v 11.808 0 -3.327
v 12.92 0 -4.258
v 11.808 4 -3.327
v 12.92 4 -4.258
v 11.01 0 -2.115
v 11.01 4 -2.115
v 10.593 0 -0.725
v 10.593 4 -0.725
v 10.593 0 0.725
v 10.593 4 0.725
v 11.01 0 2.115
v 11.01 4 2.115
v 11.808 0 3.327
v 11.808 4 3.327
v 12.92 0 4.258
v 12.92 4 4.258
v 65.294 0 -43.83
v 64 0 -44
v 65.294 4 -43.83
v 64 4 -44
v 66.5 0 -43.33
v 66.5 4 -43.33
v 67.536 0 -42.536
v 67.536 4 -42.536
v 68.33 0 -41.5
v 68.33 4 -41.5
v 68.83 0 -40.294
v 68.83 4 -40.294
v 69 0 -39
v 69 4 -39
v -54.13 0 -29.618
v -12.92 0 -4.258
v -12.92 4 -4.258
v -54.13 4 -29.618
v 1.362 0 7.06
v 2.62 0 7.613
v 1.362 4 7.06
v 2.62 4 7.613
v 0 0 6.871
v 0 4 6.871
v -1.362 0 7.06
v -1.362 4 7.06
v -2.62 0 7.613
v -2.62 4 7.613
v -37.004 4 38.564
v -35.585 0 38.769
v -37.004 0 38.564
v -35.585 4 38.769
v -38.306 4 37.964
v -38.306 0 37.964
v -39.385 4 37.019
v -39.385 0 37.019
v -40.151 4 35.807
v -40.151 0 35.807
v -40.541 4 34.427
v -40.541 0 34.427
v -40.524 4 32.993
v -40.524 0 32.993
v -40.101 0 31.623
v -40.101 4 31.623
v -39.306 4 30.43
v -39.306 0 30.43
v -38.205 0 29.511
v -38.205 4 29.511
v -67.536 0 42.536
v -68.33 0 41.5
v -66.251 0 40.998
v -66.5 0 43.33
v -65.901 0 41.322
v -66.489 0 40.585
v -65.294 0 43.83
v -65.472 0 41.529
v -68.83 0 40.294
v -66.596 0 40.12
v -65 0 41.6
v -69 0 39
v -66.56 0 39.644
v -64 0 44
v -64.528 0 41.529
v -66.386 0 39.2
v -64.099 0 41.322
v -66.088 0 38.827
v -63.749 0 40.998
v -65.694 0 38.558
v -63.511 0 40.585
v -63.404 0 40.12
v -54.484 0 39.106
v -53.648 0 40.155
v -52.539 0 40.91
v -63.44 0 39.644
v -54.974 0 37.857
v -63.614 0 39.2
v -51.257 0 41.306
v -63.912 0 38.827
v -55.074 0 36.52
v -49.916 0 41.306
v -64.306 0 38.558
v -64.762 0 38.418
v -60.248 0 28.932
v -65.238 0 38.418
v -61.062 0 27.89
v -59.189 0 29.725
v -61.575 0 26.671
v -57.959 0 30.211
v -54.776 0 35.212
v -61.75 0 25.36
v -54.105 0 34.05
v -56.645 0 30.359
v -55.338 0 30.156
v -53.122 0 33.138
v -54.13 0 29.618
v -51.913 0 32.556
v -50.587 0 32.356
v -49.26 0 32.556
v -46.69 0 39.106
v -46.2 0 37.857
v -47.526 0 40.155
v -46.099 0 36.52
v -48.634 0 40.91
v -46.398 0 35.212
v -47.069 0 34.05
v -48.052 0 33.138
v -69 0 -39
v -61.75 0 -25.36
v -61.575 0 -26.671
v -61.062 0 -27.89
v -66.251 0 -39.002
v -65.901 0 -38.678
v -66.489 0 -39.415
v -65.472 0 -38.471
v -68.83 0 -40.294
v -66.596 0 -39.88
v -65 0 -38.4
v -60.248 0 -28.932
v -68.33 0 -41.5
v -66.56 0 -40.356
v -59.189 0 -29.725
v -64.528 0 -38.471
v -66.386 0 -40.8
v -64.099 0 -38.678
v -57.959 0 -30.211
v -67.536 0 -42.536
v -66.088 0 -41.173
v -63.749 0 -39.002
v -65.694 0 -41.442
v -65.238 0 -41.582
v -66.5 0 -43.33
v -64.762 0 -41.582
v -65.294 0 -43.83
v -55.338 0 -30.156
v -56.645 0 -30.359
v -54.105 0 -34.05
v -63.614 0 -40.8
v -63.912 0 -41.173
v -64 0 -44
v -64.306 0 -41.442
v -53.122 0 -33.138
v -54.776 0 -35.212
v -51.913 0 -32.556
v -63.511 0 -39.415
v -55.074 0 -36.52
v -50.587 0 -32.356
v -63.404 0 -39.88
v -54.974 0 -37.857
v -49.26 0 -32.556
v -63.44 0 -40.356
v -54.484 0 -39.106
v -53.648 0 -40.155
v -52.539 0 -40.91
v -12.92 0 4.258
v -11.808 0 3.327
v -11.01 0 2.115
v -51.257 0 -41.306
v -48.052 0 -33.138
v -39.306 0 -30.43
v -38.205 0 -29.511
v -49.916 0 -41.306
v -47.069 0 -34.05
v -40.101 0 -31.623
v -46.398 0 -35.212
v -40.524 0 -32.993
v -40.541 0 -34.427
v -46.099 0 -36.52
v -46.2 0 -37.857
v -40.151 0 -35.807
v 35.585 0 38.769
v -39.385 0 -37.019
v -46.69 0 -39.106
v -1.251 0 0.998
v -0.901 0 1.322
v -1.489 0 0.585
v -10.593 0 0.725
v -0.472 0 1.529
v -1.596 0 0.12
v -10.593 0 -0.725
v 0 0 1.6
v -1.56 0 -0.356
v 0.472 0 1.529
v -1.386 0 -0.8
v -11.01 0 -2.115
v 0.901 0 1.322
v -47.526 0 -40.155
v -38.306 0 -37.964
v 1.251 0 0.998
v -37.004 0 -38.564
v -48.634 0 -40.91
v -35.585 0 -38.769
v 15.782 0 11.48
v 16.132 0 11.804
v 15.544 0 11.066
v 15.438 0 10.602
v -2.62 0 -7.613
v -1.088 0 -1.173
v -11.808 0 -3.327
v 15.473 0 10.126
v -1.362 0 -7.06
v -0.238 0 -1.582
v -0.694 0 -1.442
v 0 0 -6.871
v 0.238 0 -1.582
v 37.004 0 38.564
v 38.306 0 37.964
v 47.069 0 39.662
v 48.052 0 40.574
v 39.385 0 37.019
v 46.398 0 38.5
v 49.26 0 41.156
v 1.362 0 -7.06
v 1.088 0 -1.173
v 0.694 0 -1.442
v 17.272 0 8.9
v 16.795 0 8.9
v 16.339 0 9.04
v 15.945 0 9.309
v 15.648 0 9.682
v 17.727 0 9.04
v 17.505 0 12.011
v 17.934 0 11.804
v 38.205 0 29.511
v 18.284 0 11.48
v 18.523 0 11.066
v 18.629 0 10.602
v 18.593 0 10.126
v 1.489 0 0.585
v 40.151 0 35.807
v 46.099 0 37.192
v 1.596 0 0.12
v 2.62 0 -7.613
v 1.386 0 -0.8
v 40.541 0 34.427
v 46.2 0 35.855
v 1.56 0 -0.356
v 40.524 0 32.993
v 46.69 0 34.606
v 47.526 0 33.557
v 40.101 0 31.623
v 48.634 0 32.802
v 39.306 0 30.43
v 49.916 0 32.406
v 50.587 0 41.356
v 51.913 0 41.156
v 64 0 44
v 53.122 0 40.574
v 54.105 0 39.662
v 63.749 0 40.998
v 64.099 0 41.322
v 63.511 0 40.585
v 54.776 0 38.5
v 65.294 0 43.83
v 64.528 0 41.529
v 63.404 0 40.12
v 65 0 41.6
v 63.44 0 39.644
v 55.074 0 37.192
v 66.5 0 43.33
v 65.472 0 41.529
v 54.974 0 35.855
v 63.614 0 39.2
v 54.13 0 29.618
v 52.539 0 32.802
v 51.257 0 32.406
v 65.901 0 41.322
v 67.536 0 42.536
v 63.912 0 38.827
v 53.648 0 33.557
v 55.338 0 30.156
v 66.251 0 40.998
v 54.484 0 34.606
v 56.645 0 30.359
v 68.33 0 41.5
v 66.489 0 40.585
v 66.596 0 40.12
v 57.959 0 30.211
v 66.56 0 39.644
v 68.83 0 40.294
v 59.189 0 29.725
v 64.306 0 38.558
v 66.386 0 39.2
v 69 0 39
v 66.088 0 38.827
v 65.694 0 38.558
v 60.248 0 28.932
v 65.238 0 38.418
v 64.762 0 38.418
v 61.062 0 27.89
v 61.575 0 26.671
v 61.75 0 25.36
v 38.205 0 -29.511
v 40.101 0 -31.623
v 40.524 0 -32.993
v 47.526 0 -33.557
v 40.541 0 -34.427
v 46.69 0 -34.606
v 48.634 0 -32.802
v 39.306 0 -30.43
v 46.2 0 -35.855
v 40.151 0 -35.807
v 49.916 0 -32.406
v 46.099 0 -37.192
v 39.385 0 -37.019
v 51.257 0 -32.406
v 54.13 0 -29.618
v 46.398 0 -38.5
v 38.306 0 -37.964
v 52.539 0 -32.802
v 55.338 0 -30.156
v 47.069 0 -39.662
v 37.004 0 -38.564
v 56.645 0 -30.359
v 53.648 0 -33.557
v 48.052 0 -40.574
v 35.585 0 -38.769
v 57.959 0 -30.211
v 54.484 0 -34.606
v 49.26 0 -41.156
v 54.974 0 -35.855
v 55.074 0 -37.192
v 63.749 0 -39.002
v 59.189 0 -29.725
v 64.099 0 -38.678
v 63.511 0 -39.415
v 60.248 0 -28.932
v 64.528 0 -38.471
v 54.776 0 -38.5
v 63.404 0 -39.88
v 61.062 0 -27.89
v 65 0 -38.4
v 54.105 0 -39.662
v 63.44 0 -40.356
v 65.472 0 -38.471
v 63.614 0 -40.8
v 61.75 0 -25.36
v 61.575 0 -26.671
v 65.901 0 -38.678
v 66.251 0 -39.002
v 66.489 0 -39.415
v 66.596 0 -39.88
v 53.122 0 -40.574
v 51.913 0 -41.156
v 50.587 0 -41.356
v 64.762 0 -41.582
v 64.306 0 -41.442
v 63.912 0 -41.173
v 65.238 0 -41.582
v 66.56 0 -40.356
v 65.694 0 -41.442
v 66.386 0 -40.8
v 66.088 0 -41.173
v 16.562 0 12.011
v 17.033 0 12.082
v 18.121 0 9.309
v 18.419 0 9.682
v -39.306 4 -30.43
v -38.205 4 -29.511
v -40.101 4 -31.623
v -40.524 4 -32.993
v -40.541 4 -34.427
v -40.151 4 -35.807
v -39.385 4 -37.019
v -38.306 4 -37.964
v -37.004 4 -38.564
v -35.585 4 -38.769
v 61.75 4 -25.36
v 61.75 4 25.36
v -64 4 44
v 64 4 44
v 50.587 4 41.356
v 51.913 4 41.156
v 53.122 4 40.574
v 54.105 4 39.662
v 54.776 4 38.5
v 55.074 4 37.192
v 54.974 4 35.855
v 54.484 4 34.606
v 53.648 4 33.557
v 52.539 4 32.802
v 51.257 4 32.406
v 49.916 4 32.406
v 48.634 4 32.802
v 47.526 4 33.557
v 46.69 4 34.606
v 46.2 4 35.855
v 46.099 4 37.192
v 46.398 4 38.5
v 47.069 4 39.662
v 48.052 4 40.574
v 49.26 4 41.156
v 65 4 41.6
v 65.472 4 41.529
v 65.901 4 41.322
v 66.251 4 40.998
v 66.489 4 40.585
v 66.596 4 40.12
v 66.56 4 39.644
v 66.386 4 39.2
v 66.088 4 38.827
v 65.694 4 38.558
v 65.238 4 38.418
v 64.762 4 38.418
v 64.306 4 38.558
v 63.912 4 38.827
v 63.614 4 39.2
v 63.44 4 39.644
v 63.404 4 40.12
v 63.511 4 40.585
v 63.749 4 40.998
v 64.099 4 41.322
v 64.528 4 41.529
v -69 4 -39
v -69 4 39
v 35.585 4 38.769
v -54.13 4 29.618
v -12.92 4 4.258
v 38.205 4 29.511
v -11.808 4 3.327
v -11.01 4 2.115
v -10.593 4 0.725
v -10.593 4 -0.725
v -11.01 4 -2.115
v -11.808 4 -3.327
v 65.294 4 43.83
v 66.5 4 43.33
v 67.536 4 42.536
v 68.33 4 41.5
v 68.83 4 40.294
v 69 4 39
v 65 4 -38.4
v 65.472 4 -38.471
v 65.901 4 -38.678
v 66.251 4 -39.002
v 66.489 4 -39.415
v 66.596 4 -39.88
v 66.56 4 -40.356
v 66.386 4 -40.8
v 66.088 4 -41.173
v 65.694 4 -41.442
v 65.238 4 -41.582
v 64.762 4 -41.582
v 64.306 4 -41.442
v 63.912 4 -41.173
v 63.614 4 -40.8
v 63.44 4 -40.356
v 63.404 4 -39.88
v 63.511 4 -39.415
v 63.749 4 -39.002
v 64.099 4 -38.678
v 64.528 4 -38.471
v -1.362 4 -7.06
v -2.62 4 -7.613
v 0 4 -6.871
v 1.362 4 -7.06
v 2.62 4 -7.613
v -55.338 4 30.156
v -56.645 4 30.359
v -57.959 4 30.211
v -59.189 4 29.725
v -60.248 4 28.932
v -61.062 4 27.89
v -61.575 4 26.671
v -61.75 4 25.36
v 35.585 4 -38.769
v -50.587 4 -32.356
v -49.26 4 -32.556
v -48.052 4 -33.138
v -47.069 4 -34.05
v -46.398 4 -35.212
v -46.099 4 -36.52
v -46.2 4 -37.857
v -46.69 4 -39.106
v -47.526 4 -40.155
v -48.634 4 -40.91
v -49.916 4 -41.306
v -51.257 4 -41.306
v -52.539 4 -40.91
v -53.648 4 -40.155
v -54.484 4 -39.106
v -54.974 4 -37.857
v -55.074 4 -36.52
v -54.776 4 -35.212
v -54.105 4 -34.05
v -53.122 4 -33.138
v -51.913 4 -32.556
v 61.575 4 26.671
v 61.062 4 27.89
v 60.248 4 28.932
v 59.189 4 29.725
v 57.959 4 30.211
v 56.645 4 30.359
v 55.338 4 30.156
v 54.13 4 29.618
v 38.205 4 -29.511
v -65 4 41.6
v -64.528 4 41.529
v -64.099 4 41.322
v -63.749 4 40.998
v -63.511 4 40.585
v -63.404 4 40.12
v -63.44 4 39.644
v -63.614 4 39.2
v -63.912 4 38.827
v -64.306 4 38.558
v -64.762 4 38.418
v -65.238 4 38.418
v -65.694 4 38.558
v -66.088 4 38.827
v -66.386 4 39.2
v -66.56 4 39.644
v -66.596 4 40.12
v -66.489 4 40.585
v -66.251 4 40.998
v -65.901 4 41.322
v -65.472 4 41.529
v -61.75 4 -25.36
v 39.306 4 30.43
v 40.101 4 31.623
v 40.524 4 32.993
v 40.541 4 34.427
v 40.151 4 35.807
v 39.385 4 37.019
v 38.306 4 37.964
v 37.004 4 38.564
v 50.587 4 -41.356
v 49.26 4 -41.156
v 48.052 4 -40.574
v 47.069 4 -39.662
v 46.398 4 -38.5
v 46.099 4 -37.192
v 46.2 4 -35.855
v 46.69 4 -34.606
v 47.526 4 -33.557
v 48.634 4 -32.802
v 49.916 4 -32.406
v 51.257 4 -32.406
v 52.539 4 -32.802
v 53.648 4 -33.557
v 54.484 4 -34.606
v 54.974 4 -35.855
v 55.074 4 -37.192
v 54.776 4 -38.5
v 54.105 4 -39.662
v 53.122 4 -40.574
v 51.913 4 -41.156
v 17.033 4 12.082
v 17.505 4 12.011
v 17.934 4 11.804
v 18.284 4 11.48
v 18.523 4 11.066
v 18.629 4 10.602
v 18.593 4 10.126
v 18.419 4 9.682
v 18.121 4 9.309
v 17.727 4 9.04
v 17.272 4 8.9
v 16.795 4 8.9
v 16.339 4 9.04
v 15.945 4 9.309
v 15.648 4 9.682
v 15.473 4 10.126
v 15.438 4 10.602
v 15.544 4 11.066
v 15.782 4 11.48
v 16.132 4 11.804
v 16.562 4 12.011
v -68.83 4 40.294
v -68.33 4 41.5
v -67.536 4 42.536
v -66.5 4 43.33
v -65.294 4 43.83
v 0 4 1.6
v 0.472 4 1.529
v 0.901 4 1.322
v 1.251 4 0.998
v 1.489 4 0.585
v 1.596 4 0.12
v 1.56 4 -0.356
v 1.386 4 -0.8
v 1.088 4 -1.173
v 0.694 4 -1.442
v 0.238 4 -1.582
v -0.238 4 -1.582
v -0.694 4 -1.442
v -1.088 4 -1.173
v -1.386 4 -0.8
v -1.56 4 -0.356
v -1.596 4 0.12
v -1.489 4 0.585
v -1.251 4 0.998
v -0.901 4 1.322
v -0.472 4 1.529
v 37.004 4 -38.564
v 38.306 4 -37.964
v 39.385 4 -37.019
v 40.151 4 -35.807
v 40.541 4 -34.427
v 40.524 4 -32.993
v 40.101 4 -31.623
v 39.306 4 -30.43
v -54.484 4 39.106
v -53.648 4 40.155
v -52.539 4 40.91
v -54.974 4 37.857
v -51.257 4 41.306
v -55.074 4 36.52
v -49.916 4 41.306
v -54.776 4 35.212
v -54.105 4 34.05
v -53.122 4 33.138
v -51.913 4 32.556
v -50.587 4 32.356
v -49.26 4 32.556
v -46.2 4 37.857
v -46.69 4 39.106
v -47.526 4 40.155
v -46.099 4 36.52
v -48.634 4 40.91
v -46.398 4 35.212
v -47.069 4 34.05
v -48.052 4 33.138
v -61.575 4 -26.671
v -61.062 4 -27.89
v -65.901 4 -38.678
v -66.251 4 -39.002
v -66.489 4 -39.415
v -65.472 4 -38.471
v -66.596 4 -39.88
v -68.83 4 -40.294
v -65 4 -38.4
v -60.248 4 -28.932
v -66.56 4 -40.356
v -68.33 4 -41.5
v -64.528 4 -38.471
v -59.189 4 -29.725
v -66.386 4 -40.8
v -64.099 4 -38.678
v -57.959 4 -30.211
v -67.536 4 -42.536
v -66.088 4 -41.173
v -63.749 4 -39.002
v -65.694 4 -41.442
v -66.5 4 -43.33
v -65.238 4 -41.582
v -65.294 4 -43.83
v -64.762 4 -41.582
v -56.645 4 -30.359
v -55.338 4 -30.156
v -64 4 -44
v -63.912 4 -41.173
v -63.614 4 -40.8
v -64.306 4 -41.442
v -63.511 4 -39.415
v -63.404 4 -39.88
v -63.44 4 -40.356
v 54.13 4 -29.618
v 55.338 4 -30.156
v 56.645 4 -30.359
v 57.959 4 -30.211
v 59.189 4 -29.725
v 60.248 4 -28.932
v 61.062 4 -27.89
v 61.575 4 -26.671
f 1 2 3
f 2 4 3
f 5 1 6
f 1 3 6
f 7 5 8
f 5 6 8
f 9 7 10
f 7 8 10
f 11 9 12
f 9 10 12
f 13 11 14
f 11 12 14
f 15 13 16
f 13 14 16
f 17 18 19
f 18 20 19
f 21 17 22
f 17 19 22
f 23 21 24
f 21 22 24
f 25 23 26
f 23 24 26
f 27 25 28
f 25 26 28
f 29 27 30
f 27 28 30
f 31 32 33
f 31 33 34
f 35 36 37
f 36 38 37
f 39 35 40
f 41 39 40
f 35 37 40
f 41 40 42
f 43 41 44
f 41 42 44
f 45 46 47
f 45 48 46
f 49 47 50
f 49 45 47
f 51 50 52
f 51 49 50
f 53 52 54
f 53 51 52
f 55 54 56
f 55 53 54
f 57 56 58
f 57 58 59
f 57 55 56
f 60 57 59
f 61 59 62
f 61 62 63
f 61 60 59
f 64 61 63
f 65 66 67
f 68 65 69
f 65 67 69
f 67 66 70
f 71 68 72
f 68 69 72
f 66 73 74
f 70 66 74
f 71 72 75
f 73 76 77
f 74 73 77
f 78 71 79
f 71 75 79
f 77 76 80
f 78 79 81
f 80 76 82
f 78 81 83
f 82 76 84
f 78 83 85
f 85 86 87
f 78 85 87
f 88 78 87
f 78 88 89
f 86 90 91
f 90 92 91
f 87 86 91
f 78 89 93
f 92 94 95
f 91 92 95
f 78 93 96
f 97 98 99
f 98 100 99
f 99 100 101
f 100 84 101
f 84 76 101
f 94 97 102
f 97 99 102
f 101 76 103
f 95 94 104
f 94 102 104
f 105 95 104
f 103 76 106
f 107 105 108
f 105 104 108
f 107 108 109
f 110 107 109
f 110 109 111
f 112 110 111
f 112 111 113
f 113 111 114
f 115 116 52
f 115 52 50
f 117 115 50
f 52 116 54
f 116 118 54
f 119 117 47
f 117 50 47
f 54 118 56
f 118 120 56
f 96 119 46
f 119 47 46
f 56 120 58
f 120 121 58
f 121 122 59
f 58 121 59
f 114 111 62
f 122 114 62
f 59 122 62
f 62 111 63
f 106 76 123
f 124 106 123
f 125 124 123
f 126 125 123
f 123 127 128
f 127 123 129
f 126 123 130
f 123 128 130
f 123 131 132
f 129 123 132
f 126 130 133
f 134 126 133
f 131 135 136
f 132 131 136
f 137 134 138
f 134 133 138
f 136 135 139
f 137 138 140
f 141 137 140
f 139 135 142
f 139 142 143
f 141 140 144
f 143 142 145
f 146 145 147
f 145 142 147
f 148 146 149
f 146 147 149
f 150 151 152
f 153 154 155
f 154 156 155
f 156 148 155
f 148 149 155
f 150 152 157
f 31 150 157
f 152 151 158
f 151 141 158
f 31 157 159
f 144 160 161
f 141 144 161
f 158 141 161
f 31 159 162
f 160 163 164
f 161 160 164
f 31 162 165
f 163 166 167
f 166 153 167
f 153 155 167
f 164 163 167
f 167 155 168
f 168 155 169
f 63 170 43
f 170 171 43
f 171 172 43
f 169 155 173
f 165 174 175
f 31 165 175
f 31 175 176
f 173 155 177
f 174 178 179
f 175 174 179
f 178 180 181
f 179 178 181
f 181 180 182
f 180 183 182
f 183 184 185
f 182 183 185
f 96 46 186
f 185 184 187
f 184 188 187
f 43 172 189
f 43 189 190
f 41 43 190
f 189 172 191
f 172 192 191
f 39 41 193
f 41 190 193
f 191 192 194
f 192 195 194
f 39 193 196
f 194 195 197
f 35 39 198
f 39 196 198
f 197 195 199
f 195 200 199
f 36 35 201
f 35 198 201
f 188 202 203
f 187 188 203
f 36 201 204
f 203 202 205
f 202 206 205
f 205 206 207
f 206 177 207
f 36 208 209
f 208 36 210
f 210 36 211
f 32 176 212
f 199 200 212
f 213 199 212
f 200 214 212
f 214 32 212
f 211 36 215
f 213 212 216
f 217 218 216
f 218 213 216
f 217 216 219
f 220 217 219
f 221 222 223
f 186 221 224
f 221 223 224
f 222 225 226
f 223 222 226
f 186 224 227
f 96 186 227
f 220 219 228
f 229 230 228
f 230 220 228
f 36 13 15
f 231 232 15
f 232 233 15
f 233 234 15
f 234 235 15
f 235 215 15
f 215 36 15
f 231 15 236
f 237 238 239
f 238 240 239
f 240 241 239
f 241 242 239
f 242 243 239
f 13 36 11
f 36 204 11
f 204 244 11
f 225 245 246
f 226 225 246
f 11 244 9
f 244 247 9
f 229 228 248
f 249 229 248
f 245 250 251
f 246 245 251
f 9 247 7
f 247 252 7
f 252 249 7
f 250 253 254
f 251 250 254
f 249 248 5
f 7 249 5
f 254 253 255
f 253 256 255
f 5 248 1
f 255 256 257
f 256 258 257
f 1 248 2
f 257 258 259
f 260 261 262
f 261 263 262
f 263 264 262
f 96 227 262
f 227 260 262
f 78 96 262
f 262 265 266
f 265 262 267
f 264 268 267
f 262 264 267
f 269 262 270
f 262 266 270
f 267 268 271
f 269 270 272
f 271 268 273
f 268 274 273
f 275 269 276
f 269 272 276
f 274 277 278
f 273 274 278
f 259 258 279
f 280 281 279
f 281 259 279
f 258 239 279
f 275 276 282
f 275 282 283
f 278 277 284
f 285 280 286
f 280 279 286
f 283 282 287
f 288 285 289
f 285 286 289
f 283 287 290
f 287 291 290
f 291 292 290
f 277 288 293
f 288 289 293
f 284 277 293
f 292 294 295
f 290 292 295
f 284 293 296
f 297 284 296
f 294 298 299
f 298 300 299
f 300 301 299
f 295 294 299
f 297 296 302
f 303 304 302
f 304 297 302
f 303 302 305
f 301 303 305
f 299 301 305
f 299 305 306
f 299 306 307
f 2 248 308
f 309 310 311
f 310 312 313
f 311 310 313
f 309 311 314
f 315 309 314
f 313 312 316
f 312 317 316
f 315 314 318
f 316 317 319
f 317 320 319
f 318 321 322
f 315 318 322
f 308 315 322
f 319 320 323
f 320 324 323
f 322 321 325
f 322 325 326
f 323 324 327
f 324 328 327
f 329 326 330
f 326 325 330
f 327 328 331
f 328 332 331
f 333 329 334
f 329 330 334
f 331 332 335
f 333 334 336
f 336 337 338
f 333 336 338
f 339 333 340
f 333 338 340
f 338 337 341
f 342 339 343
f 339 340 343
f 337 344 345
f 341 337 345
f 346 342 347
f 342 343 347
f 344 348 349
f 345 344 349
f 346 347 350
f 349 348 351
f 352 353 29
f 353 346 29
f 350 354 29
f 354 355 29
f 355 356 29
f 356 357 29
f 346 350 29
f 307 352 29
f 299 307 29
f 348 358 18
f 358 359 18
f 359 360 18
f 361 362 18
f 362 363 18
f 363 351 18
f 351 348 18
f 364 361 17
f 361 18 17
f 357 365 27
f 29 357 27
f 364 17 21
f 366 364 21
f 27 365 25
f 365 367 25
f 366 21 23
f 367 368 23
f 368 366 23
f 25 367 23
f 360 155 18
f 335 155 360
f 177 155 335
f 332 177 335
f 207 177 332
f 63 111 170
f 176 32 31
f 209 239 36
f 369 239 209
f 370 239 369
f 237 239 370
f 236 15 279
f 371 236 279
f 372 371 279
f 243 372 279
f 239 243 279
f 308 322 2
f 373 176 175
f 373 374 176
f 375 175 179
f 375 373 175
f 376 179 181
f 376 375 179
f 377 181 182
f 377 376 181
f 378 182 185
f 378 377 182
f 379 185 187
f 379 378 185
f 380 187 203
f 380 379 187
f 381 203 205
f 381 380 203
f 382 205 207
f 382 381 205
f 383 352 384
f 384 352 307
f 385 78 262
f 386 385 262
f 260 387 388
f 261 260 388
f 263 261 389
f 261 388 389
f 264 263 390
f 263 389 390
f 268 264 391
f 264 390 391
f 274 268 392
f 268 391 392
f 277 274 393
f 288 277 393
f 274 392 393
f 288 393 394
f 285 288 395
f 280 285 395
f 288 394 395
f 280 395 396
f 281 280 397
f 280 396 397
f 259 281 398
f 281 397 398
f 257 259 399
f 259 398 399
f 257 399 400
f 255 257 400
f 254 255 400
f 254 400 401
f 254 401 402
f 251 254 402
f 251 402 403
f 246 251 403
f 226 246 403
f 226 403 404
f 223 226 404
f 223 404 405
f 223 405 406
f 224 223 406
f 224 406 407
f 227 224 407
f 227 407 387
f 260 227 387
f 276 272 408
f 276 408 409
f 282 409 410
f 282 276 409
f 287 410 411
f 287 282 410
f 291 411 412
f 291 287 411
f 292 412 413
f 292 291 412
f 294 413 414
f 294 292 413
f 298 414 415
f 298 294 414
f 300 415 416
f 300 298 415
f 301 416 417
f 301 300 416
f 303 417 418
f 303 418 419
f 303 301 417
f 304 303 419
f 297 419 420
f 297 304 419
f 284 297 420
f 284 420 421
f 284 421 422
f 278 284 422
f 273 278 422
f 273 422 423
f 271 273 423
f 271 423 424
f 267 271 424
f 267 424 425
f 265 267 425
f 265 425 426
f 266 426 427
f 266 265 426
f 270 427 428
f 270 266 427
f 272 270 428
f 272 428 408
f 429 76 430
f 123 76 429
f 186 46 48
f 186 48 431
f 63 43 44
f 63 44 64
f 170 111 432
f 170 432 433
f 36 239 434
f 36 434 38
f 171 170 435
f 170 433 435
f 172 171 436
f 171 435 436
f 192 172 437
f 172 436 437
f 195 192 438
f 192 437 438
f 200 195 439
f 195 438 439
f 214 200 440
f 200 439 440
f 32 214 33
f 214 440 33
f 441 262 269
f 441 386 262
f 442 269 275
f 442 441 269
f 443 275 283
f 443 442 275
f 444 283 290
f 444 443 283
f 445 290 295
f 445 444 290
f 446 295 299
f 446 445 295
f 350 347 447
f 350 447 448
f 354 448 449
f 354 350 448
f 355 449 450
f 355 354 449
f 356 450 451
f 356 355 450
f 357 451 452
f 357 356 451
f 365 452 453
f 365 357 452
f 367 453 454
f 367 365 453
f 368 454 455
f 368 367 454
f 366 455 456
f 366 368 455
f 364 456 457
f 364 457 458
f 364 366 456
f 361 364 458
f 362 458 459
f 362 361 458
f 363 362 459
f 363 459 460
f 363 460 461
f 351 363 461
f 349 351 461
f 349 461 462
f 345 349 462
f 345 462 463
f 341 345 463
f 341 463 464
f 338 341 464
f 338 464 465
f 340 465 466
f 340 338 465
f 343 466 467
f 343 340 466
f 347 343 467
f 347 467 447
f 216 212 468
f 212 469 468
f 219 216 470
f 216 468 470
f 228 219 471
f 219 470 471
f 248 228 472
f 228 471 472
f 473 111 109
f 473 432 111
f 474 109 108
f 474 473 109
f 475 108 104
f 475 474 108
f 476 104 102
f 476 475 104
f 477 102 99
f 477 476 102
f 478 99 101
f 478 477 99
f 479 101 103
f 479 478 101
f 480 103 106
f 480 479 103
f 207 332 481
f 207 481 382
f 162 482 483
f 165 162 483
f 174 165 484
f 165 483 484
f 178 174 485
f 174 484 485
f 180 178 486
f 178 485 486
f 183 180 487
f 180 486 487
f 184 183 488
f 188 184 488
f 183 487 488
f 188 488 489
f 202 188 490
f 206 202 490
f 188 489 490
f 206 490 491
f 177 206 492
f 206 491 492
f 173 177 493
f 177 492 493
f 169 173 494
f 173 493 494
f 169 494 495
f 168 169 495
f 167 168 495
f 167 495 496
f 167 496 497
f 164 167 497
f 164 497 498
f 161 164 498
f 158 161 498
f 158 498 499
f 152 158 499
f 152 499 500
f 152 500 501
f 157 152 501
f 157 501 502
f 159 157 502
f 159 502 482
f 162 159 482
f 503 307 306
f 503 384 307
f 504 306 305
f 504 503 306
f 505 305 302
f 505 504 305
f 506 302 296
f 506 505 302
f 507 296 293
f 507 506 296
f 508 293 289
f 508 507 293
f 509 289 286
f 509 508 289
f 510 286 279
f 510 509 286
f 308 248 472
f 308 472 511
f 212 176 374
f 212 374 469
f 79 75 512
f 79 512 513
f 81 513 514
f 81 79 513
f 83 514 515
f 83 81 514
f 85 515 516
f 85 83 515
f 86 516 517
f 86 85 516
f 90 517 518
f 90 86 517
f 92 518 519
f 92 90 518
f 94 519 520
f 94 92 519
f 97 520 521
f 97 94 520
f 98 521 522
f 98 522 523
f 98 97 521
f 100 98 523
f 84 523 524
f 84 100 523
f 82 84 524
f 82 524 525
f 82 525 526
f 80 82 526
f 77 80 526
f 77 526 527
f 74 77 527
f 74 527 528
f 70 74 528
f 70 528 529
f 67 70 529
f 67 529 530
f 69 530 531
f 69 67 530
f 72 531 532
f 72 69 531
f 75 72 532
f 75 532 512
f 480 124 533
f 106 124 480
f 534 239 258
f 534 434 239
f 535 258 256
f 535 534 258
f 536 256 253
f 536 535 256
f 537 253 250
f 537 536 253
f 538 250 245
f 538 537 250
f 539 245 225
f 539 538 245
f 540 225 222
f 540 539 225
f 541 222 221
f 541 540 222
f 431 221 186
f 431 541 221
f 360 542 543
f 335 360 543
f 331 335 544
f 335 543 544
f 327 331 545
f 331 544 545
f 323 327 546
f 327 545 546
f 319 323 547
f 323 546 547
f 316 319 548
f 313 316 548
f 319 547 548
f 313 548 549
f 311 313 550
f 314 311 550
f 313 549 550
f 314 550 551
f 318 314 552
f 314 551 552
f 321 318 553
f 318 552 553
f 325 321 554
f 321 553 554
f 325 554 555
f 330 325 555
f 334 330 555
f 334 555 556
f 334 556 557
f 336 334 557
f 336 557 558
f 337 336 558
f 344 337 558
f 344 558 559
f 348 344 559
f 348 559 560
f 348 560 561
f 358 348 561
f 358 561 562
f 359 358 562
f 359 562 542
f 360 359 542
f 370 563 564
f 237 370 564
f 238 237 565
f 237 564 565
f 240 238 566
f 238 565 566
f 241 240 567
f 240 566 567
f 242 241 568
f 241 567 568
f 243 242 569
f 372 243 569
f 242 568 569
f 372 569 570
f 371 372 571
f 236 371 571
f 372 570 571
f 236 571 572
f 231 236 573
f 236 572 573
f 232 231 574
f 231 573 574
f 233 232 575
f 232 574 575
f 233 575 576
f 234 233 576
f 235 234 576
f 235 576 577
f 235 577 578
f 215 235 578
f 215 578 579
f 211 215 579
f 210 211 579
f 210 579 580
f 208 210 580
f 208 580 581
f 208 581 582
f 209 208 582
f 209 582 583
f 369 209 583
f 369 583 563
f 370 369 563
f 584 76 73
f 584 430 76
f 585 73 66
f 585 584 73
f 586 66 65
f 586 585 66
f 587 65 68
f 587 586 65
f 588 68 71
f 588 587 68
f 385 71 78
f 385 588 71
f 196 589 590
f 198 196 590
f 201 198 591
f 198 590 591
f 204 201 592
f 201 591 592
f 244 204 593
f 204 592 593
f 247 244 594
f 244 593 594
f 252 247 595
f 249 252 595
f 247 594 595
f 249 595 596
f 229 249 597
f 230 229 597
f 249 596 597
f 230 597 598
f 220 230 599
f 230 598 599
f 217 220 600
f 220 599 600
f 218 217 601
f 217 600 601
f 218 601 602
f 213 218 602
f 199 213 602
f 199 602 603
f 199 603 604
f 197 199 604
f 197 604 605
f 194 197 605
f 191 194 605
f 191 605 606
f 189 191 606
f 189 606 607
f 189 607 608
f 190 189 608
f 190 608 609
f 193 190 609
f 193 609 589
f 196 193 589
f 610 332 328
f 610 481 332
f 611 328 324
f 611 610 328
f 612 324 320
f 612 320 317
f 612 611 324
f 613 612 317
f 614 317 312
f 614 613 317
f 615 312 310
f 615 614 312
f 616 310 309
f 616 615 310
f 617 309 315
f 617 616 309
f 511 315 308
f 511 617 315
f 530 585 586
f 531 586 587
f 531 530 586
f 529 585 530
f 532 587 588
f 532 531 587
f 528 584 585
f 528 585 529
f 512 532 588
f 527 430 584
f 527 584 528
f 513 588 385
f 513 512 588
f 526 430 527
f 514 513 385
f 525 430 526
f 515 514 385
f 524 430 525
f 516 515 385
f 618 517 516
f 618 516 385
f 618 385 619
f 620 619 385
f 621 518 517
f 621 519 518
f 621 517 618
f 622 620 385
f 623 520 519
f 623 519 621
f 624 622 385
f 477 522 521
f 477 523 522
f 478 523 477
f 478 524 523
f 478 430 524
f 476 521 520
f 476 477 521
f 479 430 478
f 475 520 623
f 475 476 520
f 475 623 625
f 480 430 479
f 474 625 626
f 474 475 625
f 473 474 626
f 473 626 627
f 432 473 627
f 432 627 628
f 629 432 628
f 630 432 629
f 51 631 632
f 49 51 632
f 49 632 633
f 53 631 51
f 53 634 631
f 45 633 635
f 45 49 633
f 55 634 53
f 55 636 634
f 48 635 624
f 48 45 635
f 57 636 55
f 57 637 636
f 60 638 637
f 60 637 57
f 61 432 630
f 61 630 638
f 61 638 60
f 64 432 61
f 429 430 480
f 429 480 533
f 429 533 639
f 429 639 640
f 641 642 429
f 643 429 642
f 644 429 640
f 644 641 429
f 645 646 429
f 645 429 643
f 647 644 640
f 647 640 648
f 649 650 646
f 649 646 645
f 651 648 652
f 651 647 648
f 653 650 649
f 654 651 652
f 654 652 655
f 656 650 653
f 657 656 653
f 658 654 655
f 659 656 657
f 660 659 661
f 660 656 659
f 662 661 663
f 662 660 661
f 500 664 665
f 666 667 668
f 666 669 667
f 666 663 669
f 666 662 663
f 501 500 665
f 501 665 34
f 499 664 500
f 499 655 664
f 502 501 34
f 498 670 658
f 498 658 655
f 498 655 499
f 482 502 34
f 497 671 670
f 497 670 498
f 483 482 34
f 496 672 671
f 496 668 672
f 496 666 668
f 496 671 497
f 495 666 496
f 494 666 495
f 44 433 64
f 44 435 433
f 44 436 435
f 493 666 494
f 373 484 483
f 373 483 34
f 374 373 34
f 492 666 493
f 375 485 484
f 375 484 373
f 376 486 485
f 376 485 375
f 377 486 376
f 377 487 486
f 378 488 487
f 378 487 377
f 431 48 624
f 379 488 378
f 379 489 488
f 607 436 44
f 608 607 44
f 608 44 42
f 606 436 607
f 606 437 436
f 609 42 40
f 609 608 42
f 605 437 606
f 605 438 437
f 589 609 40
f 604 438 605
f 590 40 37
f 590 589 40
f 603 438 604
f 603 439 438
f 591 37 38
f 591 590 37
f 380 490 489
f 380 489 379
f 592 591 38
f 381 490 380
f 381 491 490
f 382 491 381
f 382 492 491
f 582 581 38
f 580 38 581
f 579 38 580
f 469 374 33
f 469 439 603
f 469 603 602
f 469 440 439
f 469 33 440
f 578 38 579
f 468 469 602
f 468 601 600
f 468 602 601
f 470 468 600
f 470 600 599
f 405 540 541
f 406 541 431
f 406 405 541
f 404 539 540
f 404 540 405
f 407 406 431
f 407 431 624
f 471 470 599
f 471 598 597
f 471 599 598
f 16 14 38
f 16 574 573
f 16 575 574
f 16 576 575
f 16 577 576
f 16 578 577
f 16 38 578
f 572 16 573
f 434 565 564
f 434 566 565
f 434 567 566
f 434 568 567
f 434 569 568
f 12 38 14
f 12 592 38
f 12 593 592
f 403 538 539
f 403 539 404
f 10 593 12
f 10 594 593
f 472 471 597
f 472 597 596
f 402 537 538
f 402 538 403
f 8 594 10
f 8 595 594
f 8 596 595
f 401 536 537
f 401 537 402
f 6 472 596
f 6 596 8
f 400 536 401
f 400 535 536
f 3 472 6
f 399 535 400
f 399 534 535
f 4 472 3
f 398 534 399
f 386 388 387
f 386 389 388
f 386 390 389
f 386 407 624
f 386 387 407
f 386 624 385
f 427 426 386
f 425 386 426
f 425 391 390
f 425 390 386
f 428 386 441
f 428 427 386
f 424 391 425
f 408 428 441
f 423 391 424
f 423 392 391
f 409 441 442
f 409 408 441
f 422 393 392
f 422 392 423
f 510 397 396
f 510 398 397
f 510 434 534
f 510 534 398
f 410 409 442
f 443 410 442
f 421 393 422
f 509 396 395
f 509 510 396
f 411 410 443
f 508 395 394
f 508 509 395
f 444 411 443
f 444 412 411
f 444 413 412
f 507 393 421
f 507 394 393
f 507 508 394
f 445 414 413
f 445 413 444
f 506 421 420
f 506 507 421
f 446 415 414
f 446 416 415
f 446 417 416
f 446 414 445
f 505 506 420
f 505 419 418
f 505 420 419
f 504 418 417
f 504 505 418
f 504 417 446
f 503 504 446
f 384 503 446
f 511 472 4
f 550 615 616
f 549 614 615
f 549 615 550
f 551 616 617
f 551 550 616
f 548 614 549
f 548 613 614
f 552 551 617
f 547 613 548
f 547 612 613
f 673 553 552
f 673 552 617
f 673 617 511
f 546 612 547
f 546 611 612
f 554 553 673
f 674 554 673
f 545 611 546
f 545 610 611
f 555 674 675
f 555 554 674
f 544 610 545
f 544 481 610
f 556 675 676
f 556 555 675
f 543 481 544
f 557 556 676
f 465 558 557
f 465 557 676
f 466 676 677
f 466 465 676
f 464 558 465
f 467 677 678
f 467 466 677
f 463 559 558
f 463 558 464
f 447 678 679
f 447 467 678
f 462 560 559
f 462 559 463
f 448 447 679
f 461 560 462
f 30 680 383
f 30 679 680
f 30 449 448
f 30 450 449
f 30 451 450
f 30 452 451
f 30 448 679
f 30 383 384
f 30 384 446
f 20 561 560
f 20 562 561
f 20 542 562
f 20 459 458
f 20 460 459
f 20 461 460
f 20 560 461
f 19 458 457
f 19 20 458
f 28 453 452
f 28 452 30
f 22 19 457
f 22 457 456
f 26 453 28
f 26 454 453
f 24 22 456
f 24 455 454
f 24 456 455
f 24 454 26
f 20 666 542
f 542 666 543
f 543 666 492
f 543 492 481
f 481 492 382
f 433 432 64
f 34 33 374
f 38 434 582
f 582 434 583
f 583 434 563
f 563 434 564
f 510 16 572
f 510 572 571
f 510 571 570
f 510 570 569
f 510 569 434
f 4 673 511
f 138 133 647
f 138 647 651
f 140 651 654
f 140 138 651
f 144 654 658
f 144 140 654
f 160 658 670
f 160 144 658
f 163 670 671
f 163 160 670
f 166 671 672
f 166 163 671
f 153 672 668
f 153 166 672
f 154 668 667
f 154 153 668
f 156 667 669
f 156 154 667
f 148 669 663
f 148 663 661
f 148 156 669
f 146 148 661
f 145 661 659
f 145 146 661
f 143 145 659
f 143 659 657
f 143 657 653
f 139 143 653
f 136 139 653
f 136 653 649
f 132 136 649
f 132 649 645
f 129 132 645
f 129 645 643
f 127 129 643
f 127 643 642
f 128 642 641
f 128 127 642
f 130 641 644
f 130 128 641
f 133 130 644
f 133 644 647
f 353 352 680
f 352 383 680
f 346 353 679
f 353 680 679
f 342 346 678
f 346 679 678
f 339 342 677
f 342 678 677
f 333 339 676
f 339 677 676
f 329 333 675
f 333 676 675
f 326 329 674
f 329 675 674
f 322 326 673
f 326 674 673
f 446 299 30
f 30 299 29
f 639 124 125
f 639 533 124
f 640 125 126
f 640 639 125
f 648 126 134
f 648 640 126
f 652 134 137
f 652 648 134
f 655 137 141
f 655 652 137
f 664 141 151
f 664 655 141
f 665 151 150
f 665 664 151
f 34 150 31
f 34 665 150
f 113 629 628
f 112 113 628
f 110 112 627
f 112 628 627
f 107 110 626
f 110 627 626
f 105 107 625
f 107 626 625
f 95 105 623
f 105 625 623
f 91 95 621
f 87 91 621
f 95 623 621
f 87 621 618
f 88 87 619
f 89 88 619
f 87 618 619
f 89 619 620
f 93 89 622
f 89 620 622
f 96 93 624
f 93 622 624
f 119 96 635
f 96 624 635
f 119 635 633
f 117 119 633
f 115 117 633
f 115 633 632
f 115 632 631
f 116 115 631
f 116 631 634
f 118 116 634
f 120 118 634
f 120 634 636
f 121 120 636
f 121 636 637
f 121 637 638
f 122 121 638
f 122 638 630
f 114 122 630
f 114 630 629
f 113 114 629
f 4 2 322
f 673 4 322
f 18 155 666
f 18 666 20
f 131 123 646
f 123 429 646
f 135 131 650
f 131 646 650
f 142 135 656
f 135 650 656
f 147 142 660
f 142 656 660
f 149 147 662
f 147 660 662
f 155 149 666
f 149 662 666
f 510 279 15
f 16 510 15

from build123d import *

# Parameters (mm, degrees)
SKETCH_1_W          = 138
SKETCH_1_H          = 88
SKETCH_1_R          = 1.6
EXTRUDE_1_DEPTH     = 4
FILLET_1_R          = 5
FILLET_2_R          = 5
SKETCH_2_R          = 4.5
CUT_EXTRUDE_1_DEPTH = 82.932899375
SKETCH_3_R          = 1.6
CUT_EXTRUDE_2_DEPTH = 82.932899375


with BuildPart() as part:
    # 草图1 → 凸台-拉伸1 (new body)
    with BuildSketch(Plane(origin=(0, 0, 0), x_dir=(1, 0, 0), z_dir=(0, 1, 0))):
        Rectangle(SKETCH_1_W, SKETCH_1_H)
        with Locations(Location((65, 40, 0), (0, 0, 270))):
            Circle(SKETCH_1_R, mode=Mode.SUBTRACT)
        with Locations(Location((65, -40, 0), (0, 0, 270))):
            Circle(SKETCH_1_R, mode=Mode.SUBTRACT)
        with Locations(Location((-65, -40, 0), (0, 0, 270))):
            Circle(SKETCH_1_R, mode=Mode.SUBTRACT)
        with Locations(Location((-65, 40, 0), (0, 0, 270))):
            Circle(SKETCH_1_R, mode=Mode.SUBTRACT)
        Polygon((-53.25, 38.769230769), (0, 6), (53.25, 38.769230769), align=None, mode=Mode.SUBTRACT)
        Polygon((53.25, -38.769230769), (0, -6), (-53.25, -38.769230769), align=None, mode=Mode.SUBTRACT)
        Polygon((-61.75, -34.307692308), (-6, 0), (-61.75, 34.307692308), align=None, mode=Mode.SUBTRACT)
        Polygon((61.75, -34.307692308), (6, 0), (61.75, 34.307692308), align=None, mode=Mode.SUBTRACT)
    extrude(amount=EXTRUDE_1_DEPTH)

    # 圆角1
    fillet_1_edges = [part.edges().sort_by_distance(p)[0] for p in [
        (0, 2, -6),
        (53.25, 2, -38.769230769),
        (-53.25, 2, -38.769230769),
        (0, 2, 6),
        (-53.25, 2, 38.769230769),
        (53.25, 2, 38.769230769),
        (-6, 2, 0),
        (-61.75, 2, -34.307692308),
        (-61.75, 2, 34.307692308),
        (61.75, 2, -34.307692308),
        (6, 2, 0),
        (61.75, 2, 34.307692308),
    ]]
    fillet(fillet_1_edges, radius=FILLET_1_R)

    # 圆角2
    fillet_2_edges = [part.edges().sort_by_distance(p)[0] for p in [
        (69, 2, 44),
        (-69, 2, 44),
        (-69, 2, -44),
        (69, 2, -44),
    ]]
    fillet(fillet_2_edges, radius=FILLET_2_R)

    # 草图2 → 切除-拉伸1 (cut, through all)
    with BuildSketch(Plane(origin=(0, 4, 0), x_dir=(1, 0, 0), z_dir=(0, 1, 0))):
        with Locations(Location((50.58680401, -36.855868382, 0), (0, 0, 270))):
            Circle(SKETCH_2_R)
        with Locations(Location((-50.58680401, -36.855868382, 0), (0, 0, 90))):
            Circle(SKETCH_2_R)
        with Locations(Location((-50.58680401, 36.855868382, 0), (0, 0, 270))):
            Circle(SKETCH_2_R)
        with Locations(Location((50.58680401, 36.855868382, 0), (0, 0, 90))):
            Circle(SKETCH_2_R)
    extrude(amount=-CUT_EXTRUDE_1_DEPTH, mode=Mode.SUBTRACT)

    # 草图3 → 切除-拉伸2 (cut, through all)
    with BuildSketch(Plane(origin=(0, 4, 0), x_dir=(1, 0, 0), z_dir=(0, 1, 0))):
        with Locations(Location((17.033166334, -10.481948513, 0), (0, 0, 270))):
            Circle(SKETCH_3_R)
        with Locations(Location((0, 0, 0), (0, 0, 270))):
            Circle(SKETCH_3_R)
    extrude(amount=-CUT_EXTRUDE_2_DEPTH, mode=Mode.SUBTRACT)


solid = part.part
